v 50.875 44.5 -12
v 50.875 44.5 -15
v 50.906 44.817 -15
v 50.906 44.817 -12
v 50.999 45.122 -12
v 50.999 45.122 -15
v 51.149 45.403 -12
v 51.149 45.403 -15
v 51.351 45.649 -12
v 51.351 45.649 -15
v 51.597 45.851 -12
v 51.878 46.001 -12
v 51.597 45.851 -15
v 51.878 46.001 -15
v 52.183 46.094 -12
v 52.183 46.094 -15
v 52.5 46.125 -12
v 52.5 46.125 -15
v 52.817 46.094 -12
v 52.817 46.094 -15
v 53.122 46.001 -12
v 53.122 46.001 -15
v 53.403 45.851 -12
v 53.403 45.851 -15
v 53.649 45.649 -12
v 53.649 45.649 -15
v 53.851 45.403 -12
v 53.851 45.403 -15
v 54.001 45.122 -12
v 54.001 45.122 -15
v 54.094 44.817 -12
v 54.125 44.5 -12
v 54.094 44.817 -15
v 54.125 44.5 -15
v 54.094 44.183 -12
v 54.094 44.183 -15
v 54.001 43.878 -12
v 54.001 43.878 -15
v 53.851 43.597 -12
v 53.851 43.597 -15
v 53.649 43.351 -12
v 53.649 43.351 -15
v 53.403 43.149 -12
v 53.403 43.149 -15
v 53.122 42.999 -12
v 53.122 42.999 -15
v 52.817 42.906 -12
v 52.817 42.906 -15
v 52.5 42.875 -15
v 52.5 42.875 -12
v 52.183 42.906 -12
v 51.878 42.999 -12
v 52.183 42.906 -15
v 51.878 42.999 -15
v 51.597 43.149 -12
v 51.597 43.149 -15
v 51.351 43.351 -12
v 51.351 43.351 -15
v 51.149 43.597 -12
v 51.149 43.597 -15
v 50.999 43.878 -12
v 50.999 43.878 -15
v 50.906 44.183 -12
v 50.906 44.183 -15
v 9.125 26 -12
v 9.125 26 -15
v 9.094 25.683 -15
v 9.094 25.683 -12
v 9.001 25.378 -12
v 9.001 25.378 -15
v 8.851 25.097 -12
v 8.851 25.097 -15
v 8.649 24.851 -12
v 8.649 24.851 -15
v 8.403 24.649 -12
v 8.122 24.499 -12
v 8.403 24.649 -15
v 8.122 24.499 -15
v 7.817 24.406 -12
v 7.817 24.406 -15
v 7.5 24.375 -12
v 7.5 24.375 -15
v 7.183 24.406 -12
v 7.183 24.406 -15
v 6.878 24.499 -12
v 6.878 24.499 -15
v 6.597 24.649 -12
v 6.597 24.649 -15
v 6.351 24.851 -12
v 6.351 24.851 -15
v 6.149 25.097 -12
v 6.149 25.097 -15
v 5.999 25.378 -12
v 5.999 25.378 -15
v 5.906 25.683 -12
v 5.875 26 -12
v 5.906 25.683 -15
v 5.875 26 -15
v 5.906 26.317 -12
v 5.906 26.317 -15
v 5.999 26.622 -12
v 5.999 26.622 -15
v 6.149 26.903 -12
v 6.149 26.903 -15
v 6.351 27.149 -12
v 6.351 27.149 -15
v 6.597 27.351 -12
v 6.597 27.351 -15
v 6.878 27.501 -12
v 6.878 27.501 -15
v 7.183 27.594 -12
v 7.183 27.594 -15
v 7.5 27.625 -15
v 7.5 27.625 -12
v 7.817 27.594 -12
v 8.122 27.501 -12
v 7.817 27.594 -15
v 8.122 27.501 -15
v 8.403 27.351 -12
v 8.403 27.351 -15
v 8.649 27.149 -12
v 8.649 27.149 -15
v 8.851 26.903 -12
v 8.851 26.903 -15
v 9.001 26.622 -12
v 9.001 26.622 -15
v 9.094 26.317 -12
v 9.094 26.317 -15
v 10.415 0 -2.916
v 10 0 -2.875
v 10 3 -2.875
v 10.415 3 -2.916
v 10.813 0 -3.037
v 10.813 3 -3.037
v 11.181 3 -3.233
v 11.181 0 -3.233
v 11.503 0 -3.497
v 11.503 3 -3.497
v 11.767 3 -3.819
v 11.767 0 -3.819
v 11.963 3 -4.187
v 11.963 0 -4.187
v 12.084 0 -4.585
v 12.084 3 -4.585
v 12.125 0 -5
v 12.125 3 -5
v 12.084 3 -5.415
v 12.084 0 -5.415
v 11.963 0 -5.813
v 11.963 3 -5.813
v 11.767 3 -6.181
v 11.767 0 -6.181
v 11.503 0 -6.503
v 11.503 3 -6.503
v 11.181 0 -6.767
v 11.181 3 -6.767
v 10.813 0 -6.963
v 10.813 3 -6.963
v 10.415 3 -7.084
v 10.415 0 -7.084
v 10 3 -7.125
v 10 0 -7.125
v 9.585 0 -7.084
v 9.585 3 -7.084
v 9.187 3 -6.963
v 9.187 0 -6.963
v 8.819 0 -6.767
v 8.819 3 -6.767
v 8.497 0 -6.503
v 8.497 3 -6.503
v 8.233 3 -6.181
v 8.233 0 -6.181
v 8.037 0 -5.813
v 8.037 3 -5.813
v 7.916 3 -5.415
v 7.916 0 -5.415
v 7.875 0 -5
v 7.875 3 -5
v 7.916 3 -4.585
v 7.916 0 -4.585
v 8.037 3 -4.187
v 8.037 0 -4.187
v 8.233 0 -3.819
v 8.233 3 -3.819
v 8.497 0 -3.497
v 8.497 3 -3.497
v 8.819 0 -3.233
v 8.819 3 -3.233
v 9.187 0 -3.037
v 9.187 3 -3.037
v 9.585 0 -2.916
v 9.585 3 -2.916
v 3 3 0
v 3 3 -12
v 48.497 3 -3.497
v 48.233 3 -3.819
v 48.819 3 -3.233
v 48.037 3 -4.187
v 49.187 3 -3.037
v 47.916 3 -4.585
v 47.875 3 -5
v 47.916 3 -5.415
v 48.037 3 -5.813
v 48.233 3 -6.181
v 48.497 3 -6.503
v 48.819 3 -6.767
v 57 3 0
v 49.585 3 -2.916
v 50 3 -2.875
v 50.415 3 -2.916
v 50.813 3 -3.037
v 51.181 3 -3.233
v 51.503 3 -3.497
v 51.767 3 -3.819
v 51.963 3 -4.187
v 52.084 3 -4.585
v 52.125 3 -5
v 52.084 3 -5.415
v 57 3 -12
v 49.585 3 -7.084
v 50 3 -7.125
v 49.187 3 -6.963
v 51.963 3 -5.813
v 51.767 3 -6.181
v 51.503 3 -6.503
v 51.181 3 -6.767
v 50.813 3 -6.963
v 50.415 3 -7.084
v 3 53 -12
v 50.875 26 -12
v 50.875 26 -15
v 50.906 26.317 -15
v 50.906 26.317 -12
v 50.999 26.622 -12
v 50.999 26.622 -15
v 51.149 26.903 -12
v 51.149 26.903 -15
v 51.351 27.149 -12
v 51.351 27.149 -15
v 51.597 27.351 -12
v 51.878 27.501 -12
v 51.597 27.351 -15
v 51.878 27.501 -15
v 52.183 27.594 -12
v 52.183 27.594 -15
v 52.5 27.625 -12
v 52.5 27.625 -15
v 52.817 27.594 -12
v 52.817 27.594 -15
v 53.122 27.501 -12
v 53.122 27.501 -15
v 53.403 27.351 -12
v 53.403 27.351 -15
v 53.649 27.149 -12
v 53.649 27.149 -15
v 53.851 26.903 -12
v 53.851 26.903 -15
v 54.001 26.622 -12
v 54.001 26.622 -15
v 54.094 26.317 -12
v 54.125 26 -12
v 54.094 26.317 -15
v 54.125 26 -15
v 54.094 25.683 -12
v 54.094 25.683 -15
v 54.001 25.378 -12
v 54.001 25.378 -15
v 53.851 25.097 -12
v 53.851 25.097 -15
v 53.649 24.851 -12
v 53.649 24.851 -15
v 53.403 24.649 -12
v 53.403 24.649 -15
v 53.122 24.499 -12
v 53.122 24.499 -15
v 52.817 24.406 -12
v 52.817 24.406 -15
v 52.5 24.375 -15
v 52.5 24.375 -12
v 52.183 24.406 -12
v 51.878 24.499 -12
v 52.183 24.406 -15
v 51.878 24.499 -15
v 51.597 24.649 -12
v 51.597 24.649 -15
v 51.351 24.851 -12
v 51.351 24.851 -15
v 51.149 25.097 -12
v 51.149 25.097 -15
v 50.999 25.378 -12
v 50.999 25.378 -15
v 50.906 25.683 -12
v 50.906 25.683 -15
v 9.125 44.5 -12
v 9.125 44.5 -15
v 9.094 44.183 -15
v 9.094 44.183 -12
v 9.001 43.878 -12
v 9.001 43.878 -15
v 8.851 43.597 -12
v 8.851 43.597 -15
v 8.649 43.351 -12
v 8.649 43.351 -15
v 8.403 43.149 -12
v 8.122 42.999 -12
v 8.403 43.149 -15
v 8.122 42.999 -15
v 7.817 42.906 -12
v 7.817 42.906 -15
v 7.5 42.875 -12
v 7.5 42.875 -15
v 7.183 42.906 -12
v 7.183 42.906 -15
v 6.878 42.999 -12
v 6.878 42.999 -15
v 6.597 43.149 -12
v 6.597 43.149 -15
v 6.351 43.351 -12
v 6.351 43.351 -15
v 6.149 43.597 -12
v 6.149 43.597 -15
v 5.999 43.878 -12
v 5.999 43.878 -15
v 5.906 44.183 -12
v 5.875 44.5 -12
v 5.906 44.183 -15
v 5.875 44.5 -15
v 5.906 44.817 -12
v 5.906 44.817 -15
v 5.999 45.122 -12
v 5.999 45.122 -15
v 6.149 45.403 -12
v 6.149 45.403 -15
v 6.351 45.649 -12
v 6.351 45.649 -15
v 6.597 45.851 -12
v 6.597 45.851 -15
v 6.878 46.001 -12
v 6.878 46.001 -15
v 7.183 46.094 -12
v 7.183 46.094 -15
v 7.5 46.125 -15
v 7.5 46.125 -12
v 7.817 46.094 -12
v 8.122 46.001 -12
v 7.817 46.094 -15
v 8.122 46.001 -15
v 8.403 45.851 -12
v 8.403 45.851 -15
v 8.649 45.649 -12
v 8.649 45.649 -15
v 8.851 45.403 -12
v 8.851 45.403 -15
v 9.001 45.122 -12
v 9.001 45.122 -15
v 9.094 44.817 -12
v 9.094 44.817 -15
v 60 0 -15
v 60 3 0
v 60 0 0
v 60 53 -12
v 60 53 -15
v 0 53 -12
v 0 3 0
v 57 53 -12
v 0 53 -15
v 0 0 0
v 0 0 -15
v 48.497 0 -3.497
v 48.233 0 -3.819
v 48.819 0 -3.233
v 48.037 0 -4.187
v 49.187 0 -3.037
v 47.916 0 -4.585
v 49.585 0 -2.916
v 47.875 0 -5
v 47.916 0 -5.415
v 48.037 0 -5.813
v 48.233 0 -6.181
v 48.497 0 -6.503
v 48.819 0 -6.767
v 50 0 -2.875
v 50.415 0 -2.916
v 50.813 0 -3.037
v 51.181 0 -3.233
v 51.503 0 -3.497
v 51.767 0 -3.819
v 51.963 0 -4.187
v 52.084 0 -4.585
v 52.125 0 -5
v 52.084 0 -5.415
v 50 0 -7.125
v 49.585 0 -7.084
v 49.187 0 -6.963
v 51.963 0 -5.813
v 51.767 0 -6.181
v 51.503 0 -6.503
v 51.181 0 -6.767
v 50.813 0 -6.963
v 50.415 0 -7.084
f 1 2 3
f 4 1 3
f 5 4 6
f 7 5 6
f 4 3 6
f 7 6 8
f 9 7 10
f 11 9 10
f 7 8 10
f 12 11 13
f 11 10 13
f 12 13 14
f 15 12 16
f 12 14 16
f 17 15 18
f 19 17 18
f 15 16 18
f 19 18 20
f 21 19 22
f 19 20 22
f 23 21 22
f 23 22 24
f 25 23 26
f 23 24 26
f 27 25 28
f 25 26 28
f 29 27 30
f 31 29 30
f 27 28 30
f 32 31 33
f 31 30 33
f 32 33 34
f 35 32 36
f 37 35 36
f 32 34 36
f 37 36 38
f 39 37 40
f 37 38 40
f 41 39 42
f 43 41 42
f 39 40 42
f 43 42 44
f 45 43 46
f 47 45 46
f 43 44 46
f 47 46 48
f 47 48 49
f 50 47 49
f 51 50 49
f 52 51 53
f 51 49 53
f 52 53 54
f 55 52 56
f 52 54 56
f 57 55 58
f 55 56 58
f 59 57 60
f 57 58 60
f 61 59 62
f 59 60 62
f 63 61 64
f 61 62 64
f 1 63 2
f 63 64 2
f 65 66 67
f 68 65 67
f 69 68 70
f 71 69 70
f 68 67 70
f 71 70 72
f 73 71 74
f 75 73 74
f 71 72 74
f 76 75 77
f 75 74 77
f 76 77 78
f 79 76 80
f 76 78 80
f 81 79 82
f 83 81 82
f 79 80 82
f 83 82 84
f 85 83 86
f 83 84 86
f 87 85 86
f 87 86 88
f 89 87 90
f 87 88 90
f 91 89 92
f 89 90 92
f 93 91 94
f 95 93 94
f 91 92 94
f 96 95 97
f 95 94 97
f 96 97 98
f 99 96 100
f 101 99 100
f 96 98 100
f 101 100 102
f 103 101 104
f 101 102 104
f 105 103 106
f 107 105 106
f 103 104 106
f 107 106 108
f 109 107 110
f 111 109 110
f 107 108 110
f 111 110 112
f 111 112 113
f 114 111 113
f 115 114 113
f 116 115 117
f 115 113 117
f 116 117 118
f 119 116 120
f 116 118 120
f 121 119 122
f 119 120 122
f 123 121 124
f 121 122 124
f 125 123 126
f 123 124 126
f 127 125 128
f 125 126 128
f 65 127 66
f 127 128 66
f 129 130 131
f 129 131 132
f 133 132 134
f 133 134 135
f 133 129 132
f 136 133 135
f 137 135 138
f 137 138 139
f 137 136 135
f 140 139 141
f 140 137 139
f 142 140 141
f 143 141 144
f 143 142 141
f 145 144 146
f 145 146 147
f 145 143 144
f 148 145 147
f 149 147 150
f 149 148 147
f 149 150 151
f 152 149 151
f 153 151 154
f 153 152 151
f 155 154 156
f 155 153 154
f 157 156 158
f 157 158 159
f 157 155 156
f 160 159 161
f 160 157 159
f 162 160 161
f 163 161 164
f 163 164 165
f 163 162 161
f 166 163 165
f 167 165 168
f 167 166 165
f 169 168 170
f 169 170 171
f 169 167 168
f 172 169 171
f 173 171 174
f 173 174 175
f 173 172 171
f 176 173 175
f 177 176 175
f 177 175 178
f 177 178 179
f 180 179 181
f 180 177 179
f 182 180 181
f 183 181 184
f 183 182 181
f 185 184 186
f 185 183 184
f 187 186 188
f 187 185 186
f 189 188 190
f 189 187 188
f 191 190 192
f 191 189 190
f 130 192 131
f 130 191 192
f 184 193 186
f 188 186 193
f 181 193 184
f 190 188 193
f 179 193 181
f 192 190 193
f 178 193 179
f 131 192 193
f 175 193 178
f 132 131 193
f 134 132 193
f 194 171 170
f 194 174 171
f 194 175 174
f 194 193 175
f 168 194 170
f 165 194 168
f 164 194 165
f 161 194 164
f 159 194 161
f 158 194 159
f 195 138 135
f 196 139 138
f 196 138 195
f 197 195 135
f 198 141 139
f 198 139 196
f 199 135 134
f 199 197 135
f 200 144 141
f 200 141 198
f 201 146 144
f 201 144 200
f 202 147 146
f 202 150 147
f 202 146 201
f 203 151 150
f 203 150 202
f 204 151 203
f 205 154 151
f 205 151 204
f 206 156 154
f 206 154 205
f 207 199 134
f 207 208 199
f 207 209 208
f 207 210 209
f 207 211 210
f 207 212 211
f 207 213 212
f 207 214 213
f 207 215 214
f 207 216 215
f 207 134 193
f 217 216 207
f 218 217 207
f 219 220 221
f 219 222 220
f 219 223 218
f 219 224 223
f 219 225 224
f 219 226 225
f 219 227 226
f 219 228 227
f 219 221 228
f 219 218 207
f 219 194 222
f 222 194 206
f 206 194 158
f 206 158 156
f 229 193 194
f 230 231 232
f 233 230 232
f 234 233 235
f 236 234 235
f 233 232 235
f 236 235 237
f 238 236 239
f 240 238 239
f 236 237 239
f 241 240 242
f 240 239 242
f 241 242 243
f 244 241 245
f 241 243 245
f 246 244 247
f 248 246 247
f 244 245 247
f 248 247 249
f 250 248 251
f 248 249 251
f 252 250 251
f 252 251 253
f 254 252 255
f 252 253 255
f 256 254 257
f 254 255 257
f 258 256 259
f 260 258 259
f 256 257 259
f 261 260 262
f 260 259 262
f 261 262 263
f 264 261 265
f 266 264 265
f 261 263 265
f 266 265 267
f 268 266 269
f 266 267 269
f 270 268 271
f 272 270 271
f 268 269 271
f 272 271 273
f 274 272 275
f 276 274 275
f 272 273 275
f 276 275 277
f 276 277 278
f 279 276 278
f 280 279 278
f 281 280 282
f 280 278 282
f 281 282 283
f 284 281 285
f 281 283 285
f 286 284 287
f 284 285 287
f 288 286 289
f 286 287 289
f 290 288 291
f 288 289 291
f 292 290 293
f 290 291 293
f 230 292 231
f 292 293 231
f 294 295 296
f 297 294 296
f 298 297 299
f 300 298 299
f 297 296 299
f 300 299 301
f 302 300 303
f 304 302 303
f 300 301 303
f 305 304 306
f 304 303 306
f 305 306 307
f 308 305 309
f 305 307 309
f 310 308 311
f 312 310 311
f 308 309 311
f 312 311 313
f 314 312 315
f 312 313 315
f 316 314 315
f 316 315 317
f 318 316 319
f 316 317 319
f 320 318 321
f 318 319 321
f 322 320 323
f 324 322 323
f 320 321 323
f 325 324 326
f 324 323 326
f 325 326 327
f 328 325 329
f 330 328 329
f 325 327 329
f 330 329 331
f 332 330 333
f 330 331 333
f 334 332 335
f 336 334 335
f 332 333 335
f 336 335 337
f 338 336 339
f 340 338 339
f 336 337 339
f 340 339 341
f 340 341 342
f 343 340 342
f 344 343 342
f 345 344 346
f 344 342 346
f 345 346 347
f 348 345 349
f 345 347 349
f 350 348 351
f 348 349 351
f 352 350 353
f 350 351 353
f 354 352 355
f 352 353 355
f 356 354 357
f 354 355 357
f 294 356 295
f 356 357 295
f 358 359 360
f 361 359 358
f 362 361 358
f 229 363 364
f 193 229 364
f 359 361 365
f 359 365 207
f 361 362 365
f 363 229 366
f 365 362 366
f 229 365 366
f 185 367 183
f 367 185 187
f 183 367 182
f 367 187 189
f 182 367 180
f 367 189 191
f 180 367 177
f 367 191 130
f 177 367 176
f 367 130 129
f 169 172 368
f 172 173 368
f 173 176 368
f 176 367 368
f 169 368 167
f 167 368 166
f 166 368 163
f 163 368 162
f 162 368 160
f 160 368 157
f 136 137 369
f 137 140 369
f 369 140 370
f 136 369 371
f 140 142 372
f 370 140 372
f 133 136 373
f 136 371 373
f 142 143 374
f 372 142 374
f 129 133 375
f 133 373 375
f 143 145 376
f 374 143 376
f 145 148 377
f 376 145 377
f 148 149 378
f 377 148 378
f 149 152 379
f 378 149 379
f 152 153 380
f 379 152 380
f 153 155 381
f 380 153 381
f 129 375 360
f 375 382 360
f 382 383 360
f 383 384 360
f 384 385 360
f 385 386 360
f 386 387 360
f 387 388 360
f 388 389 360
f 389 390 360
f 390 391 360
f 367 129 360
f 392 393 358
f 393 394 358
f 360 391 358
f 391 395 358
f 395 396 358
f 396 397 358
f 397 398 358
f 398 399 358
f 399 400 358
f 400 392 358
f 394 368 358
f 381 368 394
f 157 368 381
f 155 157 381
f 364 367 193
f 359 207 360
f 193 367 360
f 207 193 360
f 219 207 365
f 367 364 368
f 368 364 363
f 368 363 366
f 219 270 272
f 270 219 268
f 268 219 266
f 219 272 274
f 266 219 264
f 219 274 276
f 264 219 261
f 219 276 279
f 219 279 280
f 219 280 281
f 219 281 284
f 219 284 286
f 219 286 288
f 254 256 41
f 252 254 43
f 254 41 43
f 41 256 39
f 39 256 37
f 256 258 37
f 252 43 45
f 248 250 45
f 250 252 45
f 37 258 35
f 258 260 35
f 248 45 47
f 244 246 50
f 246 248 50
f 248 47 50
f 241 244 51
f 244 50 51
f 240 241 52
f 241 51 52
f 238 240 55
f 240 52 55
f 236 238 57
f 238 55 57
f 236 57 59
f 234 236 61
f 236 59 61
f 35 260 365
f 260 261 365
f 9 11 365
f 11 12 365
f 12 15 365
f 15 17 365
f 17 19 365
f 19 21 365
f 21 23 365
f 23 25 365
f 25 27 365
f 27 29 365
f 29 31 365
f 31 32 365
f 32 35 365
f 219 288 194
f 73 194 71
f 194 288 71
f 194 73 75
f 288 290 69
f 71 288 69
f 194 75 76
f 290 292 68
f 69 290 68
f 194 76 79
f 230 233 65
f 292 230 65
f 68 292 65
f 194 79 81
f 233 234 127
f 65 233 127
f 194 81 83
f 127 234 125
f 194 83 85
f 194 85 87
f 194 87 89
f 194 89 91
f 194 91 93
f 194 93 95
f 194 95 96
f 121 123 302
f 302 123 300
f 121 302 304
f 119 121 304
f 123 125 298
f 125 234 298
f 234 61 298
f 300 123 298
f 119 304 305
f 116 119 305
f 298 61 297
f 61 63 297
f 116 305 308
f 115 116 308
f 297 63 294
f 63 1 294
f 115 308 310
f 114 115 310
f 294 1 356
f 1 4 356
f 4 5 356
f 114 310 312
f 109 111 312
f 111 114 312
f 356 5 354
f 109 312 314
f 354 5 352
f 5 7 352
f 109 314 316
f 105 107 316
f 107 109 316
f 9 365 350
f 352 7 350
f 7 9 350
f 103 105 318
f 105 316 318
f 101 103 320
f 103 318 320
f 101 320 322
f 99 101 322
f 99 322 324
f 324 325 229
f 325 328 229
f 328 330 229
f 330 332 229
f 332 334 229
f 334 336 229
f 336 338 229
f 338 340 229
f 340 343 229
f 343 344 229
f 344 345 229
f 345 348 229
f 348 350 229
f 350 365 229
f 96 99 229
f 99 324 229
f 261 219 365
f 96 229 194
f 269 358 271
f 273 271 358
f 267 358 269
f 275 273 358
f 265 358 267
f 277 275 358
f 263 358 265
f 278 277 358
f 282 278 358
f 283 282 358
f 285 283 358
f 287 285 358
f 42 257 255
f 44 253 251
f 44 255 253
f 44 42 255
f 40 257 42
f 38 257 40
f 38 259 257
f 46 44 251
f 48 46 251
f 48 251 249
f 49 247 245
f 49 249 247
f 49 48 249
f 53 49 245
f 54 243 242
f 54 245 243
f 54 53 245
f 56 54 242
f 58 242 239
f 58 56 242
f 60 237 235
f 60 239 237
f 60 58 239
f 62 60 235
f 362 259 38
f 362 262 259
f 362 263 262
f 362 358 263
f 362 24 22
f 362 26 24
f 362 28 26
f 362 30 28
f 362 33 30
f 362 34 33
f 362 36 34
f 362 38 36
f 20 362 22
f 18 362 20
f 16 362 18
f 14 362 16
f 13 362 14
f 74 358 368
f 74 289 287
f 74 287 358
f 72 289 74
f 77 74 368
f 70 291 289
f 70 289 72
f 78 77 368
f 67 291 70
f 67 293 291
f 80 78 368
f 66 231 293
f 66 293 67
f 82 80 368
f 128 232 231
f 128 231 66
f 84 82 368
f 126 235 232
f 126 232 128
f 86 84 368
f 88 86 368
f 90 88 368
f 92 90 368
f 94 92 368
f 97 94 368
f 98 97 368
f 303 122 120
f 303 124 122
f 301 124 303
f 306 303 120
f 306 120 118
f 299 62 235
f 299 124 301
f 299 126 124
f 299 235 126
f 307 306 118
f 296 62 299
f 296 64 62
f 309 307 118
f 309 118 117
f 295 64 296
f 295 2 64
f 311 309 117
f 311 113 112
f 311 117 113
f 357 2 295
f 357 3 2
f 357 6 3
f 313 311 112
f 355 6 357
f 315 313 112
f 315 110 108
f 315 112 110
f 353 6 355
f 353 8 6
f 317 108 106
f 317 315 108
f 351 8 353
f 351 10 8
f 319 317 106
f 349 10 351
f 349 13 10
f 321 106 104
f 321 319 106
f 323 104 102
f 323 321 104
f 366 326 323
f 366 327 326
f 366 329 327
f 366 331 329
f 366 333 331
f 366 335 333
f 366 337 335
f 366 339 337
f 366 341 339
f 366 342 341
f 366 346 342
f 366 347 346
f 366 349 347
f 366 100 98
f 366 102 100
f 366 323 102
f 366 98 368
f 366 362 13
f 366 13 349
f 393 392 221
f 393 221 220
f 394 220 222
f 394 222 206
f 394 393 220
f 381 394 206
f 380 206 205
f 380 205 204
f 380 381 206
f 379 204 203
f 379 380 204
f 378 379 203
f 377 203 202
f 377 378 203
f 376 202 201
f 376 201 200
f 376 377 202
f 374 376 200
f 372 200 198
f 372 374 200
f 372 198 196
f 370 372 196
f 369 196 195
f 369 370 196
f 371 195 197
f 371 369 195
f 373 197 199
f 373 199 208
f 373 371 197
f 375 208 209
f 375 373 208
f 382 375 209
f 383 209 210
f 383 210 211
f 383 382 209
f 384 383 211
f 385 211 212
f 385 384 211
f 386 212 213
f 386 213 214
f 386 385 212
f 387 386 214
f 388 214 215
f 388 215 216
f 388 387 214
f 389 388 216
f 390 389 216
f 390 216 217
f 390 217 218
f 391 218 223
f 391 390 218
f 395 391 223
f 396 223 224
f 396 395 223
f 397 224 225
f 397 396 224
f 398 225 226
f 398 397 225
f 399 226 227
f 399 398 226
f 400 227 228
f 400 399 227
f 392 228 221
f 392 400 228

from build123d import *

# Parameters (mm, degrees)
SKETCH1_W           = 60
SKETCH1_H           = 15
SKETCH1_R           = 2.125
BOSS_EXTRUDE1_DEPTH = 3
SKETCH2_W           = 60
SKETCH2_H           = 50
SKETCH2_R           = 1.625
BOSS_EXTRUDE2_DEPTH = 3
BOSS_EXTRUDE3_DEPTH = 3


with BuildPart() as part:
    # Sketch1 → Boss-Extrude1 (new body)
    with BuildSketch(Plane(origin=(0, 0, 0), x_dir=(1, 0, 0), z_dir=(0, 1, 0))):
        with Locations((30, 7.5)):
            Rectangle(SKETCH1_W, SKETCH1_H)
        with Locations(Location((10, 5, 0), (0, 0, 270))):
            Circle(SKETCH1_R, mode=Mode.SUBTRACT)
        with Locations(Location((50, 5, 0), (0, 0, 90))):
            Circle(SKETCH1_R, mode=Mode.SUBTRACT)
    extrude(amount=BOSS_EXTRUDE1_DEPTH)

    # Sketch2 → Boss-Extrude2 (add)
    with BuildSketch(Plane(origin=(0, 0, -15), x_dir=(-1, 0, 0), z_dir=(0, 0, -1))):
        with Locations((-30, 28)):
            Rectangle(SKETCH2_W, SKETCH2_H)
        with Locations((-52.5, 44.5)):
            Circle(SKETCH2_R, mode=Mode.SUBTRACT)
        with Locations((-52.5, 26)):
            Circle(SKETCH2_R, mode=Mode.SUBTRACT)
        with Locations(Location((-7.5, 26, 0), (0, 0, 180))):
            Circle(SKETCH2_R, mode=Mode.SUBTRACT)
        with Locations(Location((-7.5, 44.5, 0), (0, 0, 180))):
            Circle(SKETCH2_R, mode=Mode.SUBTRACT)
    extrude(amount=-BOSS_EXTRUDE2_DEPTH)

    # Sketch3 → Boss-Extrude3 (add)
    with BuildSketch(Plane.ZY):
        Polygon((-12, 53), (0, 3), (-12, 3), align=None)
    boss_extrude3 = extrude(amount=-BOSS_EXTRUDE3_DEPTH)

    # Mirror1: Boss-Extrude3 across plane
    add(boss_extrude3.mirror(Plane.ZY.offset(-30)))


solid = part.part
